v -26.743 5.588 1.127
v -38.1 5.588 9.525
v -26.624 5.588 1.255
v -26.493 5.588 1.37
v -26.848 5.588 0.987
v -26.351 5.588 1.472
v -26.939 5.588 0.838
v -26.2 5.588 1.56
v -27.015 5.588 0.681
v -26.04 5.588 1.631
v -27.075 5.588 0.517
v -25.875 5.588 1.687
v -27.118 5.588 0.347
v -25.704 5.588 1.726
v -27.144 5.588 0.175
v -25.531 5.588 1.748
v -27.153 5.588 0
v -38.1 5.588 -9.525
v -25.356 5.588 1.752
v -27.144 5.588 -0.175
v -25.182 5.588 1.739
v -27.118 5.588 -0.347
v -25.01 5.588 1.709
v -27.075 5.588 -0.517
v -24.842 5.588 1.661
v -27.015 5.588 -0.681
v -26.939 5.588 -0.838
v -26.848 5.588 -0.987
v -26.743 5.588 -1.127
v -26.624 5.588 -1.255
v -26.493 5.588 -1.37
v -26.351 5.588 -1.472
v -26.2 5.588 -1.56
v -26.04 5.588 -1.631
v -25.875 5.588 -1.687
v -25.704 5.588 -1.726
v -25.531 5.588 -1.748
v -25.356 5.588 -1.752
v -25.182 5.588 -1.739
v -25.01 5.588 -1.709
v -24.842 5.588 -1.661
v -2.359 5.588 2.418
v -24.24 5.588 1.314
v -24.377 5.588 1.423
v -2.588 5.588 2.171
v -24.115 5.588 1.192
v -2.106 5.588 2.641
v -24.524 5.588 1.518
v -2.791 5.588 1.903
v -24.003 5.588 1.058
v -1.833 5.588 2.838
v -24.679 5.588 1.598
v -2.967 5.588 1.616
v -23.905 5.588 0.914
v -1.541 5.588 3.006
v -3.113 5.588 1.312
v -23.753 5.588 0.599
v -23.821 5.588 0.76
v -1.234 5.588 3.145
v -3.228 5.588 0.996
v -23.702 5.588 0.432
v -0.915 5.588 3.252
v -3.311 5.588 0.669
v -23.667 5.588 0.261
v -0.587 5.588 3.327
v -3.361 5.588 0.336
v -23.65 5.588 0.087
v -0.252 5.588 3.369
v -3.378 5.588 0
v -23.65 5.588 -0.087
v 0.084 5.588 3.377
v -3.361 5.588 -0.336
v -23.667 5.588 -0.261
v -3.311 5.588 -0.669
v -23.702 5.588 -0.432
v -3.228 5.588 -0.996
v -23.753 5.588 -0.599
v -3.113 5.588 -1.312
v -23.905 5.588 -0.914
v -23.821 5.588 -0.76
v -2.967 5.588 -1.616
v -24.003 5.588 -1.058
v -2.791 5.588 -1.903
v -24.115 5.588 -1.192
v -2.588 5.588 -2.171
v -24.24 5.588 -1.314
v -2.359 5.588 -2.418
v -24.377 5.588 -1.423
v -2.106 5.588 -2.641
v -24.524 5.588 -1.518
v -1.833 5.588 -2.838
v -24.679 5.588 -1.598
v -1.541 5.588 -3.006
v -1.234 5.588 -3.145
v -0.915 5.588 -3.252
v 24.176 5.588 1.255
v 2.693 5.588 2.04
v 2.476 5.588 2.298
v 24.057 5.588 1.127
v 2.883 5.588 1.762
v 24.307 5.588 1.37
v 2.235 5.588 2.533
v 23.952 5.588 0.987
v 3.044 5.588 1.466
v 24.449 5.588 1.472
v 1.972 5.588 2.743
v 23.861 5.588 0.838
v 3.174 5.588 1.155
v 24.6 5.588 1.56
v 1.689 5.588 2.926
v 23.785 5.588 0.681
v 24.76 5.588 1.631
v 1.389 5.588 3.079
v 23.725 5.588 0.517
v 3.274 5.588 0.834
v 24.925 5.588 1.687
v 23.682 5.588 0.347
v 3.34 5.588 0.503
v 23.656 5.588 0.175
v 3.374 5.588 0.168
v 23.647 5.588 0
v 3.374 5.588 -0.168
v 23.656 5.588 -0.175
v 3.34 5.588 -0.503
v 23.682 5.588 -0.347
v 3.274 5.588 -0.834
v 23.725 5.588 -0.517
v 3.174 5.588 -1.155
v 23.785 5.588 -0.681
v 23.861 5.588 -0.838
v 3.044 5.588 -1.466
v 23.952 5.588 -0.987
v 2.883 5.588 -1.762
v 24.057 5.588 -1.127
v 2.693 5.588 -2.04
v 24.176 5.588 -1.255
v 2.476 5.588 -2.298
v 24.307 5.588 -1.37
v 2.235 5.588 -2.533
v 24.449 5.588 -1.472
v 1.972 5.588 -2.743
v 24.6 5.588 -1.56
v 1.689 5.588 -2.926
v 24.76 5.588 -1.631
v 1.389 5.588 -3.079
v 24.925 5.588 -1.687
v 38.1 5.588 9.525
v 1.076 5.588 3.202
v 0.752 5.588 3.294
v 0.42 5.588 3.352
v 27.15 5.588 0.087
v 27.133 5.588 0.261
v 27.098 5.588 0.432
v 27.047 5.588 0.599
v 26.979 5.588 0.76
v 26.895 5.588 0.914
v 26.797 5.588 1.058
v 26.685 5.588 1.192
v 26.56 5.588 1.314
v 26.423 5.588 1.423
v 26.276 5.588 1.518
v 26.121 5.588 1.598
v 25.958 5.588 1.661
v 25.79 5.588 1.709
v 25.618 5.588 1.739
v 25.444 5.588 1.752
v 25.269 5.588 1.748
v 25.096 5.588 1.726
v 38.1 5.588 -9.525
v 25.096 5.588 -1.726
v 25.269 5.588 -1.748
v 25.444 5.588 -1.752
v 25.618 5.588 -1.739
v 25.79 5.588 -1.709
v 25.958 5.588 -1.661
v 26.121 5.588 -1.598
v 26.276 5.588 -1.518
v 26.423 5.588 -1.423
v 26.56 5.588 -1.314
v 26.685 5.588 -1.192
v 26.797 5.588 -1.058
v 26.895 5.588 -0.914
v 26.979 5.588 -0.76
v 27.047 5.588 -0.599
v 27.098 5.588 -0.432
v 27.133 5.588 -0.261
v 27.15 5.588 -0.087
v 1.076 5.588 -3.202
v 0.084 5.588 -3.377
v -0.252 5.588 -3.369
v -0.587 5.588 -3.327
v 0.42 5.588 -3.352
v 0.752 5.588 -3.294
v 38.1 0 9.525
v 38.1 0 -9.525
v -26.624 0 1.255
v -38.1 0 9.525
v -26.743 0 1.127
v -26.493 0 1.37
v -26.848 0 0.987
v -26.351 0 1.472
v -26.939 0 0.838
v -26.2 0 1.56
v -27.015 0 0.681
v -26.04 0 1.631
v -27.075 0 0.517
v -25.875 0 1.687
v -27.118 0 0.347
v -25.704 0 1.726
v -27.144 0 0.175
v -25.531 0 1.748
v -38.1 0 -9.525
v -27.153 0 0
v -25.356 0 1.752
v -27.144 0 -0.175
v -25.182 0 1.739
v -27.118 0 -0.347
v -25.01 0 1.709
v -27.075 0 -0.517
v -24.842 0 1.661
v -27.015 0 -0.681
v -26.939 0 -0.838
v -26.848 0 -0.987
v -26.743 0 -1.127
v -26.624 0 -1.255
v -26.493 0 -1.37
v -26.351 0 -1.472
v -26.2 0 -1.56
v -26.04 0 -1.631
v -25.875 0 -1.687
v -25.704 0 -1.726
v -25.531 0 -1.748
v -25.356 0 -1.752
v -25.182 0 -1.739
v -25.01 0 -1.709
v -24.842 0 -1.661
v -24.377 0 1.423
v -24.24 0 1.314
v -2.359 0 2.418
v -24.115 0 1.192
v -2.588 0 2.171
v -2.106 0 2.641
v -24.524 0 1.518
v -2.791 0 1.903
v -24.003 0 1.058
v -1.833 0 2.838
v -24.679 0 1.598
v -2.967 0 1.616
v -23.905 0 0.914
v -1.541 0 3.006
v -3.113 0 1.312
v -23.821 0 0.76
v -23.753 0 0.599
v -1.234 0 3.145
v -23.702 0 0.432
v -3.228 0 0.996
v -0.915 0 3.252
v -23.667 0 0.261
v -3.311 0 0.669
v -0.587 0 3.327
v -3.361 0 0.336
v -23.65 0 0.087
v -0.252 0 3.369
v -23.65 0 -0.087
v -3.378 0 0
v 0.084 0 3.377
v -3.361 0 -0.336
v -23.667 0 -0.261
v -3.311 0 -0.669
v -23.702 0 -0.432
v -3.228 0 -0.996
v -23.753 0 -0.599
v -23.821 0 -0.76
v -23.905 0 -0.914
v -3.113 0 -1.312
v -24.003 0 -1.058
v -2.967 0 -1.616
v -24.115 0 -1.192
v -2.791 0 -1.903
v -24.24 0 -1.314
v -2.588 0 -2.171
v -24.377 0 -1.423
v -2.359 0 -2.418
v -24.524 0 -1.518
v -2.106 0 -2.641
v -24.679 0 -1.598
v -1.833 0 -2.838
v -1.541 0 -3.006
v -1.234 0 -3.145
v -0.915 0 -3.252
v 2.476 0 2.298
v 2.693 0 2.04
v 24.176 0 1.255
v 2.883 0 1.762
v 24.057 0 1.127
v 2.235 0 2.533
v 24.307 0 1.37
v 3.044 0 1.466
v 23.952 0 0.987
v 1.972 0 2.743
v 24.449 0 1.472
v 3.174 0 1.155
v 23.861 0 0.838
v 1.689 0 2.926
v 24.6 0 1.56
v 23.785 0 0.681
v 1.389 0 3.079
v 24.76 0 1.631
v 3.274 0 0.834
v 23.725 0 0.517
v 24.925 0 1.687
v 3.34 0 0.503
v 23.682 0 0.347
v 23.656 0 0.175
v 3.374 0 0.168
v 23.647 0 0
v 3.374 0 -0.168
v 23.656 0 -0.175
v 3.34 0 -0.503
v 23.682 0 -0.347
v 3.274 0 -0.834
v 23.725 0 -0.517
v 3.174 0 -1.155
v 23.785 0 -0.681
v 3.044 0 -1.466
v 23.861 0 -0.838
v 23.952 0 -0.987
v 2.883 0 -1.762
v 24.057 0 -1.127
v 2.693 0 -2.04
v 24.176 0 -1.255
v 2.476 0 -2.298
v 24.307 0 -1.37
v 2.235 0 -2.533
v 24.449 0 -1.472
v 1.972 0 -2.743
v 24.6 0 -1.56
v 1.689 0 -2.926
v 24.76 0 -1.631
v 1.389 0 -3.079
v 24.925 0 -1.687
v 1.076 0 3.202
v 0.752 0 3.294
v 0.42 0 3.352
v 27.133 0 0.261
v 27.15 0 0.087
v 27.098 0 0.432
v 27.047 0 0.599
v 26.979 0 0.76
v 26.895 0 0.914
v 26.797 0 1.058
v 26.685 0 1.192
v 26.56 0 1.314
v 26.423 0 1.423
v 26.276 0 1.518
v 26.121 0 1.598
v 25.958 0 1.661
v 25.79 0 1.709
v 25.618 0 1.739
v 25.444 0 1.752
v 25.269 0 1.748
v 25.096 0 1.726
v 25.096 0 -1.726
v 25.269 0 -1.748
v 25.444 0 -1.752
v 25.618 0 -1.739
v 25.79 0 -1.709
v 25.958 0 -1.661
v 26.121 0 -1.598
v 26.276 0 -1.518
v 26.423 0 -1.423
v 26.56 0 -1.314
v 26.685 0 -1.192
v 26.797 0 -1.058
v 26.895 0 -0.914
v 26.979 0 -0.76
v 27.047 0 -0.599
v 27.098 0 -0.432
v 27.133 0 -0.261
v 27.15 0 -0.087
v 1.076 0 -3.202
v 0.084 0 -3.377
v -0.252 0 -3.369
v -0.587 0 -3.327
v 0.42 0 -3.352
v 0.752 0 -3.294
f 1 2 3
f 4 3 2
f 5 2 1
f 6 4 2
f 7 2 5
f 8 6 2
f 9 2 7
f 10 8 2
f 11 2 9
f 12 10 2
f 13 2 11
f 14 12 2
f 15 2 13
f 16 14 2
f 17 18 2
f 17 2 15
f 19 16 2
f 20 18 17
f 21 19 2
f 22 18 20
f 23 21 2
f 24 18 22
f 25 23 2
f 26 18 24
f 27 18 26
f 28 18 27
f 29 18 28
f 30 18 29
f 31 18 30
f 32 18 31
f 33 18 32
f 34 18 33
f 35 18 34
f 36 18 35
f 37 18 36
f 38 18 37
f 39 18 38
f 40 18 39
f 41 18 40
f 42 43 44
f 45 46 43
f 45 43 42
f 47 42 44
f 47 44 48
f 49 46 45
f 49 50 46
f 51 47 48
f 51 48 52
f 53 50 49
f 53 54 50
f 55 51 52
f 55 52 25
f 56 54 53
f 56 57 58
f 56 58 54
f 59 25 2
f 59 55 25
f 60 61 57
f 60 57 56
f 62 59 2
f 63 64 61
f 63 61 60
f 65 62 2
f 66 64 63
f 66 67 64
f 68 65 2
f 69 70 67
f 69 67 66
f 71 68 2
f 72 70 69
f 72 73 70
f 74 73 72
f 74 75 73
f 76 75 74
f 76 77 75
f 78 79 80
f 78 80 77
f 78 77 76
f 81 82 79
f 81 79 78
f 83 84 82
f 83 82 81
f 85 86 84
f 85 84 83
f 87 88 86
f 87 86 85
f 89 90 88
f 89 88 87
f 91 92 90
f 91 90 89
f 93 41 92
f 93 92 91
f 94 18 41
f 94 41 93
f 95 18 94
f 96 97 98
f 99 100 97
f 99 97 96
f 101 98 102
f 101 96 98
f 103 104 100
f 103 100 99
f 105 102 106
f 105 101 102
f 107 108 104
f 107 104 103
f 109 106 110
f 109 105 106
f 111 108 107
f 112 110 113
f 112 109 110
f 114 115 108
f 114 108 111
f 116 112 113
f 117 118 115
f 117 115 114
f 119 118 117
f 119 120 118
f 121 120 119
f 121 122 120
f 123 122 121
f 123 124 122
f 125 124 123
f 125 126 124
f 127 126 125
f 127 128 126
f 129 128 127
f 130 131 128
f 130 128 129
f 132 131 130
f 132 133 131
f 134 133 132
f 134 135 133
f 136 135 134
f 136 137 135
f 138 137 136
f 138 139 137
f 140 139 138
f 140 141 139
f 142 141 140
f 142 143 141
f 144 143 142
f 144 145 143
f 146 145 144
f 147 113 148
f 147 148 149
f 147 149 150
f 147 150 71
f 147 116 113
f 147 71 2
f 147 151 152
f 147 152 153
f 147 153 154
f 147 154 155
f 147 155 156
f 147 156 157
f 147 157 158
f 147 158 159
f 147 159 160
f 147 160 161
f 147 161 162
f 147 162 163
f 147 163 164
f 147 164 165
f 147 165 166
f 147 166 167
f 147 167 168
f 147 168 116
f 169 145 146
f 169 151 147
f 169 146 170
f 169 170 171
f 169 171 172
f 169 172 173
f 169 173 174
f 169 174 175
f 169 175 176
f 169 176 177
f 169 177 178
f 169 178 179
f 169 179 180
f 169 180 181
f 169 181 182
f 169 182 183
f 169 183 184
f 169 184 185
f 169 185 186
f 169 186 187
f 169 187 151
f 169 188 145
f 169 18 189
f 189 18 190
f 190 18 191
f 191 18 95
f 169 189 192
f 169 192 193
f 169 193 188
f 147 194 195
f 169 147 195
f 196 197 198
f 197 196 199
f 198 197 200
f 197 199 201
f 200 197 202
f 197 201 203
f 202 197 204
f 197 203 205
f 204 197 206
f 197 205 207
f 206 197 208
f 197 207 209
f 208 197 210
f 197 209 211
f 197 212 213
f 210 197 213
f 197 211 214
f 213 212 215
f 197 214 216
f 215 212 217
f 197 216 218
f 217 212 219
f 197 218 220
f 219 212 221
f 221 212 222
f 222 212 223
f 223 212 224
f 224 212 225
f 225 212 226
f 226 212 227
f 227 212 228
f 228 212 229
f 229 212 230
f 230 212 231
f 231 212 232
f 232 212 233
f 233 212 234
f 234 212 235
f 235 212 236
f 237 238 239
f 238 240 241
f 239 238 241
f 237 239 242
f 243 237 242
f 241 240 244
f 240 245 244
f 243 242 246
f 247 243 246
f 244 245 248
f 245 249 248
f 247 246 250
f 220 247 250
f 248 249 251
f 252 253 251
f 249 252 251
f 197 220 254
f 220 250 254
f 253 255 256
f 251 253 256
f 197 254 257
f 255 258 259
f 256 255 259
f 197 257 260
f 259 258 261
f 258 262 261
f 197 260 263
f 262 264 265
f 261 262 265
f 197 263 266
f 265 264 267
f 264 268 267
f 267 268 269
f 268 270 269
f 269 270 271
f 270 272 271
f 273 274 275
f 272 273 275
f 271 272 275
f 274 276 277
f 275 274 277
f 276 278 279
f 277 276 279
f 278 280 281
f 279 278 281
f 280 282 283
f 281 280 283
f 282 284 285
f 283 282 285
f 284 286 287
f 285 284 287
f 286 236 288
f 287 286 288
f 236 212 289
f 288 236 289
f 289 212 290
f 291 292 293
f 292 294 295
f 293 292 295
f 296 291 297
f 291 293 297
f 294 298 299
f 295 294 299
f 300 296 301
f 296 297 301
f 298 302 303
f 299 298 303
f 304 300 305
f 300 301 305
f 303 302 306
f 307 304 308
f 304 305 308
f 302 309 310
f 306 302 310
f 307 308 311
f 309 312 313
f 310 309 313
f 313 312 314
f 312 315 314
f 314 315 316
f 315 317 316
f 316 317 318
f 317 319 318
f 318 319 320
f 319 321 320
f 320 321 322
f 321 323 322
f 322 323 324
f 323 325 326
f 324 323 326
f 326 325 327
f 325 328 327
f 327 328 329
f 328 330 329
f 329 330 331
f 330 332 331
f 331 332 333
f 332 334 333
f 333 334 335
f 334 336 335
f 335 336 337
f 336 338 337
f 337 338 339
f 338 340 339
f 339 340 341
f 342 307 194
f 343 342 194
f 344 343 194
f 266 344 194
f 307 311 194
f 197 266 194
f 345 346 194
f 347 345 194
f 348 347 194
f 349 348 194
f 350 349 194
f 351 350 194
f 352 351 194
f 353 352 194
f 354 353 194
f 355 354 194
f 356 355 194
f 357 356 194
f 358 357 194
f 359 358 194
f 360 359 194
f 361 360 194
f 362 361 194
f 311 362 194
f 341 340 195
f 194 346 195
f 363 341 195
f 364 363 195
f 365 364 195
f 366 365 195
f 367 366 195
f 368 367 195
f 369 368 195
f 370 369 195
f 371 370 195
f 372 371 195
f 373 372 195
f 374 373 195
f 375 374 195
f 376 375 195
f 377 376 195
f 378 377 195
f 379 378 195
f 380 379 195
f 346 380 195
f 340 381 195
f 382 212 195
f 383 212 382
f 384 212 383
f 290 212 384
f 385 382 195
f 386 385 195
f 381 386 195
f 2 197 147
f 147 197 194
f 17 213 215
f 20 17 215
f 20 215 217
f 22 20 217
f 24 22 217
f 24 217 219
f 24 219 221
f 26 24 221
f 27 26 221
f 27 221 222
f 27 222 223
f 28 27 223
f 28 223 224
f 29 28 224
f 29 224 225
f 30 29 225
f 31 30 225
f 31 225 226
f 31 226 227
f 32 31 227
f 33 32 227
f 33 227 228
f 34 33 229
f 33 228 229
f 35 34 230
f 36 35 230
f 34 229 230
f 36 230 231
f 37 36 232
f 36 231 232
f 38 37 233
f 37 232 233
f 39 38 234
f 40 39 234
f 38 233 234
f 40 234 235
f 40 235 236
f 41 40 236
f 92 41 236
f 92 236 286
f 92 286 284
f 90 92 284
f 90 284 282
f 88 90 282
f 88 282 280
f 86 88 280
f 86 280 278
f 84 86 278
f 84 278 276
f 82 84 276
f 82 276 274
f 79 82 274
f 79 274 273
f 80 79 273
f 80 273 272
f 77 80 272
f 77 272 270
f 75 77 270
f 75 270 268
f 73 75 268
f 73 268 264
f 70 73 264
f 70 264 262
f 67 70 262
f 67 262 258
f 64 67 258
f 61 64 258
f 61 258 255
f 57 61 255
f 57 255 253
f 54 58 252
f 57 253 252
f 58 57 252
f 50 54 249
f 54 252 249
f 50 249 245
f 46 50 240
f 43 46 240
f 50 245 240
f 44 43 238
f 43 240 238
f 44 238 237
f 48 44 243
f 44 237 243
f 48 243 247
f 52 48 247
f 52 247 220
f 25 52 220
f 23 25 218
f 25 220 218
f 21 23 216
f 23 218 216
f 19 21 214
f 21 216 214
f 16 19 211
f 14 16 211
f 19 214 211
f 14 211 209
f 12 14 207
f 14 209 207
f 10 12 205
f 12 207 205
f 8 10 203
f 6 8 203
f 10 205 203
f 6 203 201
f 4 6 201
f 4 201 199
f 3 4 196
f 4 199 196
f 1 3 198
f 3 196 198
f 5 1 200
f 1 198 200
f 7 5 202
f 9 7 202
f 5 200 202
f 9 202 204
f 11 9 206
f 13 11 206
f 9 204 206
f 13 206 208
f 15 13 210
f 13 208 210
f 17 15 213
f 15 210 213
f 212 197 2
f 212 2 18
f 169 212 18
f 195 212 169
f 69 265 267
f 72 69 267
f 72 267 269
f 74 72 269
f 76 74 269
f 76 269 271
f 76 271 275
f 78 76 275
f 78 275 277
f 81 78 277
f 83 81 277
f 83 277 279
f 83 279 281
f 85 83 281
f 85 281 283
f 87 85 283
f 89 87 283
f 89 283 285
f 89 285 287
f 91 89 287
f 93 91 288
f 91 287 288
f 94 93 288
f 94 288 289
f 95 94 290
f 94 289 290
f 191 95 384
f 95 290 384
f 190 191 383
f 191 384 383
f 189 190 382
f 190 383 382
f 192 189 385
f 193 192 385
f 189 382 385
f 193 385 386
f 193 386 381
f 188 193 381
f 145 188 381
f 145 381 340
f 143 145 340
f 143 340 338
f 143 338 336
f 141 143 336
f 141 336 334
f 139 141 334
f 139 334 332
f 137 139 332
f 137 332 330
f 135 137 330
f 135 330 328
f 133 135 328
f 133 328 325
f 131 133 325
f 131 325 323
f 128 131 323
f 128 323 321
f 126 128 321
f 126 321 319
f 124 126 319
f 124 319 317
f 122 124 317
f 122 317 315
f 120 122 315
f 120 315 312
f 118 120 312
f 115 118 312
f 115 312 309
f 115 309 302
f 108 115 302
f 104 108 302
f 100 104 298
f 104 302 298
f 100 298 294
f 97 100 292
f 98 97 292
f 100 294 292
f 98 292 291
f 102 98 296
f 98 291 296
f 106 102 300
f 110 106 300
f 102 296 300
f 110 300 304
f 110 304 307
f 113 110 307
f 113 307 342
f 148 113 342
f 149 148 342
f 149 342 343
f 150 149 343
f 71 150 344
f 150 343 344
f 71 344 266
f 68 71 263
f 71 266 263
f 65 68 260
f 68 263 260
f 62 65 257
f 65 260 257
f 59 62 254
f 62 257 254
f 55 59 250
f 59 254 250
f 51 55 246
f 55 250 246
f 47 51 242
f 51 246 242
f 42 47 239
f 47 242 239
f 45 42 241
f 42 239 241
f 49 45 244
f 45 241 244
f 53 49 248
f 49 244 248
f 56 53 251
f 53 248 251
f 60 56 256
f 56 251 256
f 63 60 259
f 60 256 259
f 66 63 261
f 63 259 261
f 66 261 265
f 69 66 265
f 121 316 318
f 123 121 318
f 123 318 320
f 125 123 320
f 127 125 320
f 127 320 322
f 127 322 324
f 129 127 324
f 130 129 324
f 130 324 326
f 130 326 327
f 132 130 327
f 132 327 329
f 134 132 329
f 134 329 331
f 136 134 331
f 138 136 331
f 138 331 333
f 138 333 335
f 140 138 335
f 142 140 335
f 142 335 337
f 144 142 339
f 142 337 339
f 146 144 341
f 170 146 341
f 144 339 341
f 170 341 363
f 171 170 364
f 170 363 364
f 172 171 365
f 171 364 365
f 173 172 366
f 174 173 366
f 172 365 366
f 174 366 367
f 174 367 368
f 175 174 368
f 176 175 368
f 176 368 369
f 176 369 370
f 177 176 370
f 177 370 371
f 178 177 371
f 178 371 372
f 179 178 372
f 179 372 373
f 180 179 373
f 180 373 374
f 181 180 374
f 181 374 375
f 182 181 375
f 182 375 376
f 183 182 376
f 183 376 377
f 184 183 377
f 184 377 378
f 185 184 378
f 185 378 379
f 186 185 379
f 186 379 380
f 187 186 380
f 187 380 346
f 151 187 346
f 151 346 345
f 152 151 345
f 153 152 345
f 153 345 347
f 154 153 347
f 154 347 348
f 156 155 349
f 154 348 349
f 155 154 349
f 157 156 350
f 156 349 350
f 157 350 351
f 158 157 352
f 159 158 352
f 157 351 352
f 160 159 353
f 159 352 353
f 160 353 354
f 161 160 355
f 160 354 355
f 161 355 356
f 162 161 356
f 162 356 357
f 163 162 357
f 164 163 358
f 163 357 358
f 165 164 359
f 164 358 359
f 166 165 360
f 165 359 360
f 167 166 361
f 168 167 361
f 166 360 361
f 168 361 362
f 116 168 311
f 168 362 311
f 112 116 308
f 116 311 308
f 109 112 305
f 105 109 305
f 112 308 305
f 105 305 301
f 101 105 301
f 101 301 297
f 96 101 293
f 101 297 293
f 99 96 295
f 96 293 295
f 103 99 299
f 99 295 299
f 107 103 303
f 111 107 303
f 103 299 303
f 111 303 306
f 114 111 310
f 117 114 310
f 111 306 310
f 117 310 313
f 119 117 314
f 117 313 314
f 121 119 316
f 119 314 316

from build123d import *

# Parameters (mm, degrees)
SKETCH1_W                   = 76.2
SKETCH1_H                   = 19.05
BOSS_EXTRUDE1_DEPTH         = 5.588
F_1_4_CLEARANCE_HOLE1_D     = 6.7564
F_1_4_CLEARANCE_HOLE1_DEPTH = 19.05
F_1_4_CLEARANCE_HOLE1_TIP   = 2.029827343
F_6_CLEARANCE_HOLE1_D       = 3.5052


with BuildPart() as part:
    # Sketch1 → Boss-Extrude1 (new body)
    with BuildSketch(Plane(origin=(0, 0, 0), x_dir=(1, 0, 0), z_dir=(0, 1, 0))):
        Rectangle(SKETCH1_W, SKETCH1_H)
    extrude(amount=BOSS_EXTRUDE1_DEPTH)

    # 1/4 Clearance Hole1
    with Locations(Plane(origin=(0, 5.588, 0), x_dir=(1, 0, 0), z_dir=(0, 1, 0))):
        with Locations((0, 0)):
            Hole(F_1_4_CLEARANCE_HOLE1_D / 2, depth=F_1_4_CLEARANCE_HOLE1_DEPTH)
            with Locations((0, 0, -(F_1_4_CLEARANCE_HOLE1_DEPTH + F_1_4_CLEARANCE_HOLE1_TIP / 2))):  # 118° drill point
                Cone(0, F_1_4_CLEARANCE_HOLE1_D / 2, F_1_4_CLEARANCE_HOLE1_TIP, mode=Mode.SUBTRACT)

    # #6 Clearance Hole1 (through all)
    with Locations(Plane(origin=(0, 5.588, 0), x_dir=(1, 0, 0), z_dir=(0, 1, 0))):
        with Locations((25.4, 0), (-25.4, 0)):
            Hole(F_6_CLEARANCE_HOLE1_D / 2)


solid = part.part
